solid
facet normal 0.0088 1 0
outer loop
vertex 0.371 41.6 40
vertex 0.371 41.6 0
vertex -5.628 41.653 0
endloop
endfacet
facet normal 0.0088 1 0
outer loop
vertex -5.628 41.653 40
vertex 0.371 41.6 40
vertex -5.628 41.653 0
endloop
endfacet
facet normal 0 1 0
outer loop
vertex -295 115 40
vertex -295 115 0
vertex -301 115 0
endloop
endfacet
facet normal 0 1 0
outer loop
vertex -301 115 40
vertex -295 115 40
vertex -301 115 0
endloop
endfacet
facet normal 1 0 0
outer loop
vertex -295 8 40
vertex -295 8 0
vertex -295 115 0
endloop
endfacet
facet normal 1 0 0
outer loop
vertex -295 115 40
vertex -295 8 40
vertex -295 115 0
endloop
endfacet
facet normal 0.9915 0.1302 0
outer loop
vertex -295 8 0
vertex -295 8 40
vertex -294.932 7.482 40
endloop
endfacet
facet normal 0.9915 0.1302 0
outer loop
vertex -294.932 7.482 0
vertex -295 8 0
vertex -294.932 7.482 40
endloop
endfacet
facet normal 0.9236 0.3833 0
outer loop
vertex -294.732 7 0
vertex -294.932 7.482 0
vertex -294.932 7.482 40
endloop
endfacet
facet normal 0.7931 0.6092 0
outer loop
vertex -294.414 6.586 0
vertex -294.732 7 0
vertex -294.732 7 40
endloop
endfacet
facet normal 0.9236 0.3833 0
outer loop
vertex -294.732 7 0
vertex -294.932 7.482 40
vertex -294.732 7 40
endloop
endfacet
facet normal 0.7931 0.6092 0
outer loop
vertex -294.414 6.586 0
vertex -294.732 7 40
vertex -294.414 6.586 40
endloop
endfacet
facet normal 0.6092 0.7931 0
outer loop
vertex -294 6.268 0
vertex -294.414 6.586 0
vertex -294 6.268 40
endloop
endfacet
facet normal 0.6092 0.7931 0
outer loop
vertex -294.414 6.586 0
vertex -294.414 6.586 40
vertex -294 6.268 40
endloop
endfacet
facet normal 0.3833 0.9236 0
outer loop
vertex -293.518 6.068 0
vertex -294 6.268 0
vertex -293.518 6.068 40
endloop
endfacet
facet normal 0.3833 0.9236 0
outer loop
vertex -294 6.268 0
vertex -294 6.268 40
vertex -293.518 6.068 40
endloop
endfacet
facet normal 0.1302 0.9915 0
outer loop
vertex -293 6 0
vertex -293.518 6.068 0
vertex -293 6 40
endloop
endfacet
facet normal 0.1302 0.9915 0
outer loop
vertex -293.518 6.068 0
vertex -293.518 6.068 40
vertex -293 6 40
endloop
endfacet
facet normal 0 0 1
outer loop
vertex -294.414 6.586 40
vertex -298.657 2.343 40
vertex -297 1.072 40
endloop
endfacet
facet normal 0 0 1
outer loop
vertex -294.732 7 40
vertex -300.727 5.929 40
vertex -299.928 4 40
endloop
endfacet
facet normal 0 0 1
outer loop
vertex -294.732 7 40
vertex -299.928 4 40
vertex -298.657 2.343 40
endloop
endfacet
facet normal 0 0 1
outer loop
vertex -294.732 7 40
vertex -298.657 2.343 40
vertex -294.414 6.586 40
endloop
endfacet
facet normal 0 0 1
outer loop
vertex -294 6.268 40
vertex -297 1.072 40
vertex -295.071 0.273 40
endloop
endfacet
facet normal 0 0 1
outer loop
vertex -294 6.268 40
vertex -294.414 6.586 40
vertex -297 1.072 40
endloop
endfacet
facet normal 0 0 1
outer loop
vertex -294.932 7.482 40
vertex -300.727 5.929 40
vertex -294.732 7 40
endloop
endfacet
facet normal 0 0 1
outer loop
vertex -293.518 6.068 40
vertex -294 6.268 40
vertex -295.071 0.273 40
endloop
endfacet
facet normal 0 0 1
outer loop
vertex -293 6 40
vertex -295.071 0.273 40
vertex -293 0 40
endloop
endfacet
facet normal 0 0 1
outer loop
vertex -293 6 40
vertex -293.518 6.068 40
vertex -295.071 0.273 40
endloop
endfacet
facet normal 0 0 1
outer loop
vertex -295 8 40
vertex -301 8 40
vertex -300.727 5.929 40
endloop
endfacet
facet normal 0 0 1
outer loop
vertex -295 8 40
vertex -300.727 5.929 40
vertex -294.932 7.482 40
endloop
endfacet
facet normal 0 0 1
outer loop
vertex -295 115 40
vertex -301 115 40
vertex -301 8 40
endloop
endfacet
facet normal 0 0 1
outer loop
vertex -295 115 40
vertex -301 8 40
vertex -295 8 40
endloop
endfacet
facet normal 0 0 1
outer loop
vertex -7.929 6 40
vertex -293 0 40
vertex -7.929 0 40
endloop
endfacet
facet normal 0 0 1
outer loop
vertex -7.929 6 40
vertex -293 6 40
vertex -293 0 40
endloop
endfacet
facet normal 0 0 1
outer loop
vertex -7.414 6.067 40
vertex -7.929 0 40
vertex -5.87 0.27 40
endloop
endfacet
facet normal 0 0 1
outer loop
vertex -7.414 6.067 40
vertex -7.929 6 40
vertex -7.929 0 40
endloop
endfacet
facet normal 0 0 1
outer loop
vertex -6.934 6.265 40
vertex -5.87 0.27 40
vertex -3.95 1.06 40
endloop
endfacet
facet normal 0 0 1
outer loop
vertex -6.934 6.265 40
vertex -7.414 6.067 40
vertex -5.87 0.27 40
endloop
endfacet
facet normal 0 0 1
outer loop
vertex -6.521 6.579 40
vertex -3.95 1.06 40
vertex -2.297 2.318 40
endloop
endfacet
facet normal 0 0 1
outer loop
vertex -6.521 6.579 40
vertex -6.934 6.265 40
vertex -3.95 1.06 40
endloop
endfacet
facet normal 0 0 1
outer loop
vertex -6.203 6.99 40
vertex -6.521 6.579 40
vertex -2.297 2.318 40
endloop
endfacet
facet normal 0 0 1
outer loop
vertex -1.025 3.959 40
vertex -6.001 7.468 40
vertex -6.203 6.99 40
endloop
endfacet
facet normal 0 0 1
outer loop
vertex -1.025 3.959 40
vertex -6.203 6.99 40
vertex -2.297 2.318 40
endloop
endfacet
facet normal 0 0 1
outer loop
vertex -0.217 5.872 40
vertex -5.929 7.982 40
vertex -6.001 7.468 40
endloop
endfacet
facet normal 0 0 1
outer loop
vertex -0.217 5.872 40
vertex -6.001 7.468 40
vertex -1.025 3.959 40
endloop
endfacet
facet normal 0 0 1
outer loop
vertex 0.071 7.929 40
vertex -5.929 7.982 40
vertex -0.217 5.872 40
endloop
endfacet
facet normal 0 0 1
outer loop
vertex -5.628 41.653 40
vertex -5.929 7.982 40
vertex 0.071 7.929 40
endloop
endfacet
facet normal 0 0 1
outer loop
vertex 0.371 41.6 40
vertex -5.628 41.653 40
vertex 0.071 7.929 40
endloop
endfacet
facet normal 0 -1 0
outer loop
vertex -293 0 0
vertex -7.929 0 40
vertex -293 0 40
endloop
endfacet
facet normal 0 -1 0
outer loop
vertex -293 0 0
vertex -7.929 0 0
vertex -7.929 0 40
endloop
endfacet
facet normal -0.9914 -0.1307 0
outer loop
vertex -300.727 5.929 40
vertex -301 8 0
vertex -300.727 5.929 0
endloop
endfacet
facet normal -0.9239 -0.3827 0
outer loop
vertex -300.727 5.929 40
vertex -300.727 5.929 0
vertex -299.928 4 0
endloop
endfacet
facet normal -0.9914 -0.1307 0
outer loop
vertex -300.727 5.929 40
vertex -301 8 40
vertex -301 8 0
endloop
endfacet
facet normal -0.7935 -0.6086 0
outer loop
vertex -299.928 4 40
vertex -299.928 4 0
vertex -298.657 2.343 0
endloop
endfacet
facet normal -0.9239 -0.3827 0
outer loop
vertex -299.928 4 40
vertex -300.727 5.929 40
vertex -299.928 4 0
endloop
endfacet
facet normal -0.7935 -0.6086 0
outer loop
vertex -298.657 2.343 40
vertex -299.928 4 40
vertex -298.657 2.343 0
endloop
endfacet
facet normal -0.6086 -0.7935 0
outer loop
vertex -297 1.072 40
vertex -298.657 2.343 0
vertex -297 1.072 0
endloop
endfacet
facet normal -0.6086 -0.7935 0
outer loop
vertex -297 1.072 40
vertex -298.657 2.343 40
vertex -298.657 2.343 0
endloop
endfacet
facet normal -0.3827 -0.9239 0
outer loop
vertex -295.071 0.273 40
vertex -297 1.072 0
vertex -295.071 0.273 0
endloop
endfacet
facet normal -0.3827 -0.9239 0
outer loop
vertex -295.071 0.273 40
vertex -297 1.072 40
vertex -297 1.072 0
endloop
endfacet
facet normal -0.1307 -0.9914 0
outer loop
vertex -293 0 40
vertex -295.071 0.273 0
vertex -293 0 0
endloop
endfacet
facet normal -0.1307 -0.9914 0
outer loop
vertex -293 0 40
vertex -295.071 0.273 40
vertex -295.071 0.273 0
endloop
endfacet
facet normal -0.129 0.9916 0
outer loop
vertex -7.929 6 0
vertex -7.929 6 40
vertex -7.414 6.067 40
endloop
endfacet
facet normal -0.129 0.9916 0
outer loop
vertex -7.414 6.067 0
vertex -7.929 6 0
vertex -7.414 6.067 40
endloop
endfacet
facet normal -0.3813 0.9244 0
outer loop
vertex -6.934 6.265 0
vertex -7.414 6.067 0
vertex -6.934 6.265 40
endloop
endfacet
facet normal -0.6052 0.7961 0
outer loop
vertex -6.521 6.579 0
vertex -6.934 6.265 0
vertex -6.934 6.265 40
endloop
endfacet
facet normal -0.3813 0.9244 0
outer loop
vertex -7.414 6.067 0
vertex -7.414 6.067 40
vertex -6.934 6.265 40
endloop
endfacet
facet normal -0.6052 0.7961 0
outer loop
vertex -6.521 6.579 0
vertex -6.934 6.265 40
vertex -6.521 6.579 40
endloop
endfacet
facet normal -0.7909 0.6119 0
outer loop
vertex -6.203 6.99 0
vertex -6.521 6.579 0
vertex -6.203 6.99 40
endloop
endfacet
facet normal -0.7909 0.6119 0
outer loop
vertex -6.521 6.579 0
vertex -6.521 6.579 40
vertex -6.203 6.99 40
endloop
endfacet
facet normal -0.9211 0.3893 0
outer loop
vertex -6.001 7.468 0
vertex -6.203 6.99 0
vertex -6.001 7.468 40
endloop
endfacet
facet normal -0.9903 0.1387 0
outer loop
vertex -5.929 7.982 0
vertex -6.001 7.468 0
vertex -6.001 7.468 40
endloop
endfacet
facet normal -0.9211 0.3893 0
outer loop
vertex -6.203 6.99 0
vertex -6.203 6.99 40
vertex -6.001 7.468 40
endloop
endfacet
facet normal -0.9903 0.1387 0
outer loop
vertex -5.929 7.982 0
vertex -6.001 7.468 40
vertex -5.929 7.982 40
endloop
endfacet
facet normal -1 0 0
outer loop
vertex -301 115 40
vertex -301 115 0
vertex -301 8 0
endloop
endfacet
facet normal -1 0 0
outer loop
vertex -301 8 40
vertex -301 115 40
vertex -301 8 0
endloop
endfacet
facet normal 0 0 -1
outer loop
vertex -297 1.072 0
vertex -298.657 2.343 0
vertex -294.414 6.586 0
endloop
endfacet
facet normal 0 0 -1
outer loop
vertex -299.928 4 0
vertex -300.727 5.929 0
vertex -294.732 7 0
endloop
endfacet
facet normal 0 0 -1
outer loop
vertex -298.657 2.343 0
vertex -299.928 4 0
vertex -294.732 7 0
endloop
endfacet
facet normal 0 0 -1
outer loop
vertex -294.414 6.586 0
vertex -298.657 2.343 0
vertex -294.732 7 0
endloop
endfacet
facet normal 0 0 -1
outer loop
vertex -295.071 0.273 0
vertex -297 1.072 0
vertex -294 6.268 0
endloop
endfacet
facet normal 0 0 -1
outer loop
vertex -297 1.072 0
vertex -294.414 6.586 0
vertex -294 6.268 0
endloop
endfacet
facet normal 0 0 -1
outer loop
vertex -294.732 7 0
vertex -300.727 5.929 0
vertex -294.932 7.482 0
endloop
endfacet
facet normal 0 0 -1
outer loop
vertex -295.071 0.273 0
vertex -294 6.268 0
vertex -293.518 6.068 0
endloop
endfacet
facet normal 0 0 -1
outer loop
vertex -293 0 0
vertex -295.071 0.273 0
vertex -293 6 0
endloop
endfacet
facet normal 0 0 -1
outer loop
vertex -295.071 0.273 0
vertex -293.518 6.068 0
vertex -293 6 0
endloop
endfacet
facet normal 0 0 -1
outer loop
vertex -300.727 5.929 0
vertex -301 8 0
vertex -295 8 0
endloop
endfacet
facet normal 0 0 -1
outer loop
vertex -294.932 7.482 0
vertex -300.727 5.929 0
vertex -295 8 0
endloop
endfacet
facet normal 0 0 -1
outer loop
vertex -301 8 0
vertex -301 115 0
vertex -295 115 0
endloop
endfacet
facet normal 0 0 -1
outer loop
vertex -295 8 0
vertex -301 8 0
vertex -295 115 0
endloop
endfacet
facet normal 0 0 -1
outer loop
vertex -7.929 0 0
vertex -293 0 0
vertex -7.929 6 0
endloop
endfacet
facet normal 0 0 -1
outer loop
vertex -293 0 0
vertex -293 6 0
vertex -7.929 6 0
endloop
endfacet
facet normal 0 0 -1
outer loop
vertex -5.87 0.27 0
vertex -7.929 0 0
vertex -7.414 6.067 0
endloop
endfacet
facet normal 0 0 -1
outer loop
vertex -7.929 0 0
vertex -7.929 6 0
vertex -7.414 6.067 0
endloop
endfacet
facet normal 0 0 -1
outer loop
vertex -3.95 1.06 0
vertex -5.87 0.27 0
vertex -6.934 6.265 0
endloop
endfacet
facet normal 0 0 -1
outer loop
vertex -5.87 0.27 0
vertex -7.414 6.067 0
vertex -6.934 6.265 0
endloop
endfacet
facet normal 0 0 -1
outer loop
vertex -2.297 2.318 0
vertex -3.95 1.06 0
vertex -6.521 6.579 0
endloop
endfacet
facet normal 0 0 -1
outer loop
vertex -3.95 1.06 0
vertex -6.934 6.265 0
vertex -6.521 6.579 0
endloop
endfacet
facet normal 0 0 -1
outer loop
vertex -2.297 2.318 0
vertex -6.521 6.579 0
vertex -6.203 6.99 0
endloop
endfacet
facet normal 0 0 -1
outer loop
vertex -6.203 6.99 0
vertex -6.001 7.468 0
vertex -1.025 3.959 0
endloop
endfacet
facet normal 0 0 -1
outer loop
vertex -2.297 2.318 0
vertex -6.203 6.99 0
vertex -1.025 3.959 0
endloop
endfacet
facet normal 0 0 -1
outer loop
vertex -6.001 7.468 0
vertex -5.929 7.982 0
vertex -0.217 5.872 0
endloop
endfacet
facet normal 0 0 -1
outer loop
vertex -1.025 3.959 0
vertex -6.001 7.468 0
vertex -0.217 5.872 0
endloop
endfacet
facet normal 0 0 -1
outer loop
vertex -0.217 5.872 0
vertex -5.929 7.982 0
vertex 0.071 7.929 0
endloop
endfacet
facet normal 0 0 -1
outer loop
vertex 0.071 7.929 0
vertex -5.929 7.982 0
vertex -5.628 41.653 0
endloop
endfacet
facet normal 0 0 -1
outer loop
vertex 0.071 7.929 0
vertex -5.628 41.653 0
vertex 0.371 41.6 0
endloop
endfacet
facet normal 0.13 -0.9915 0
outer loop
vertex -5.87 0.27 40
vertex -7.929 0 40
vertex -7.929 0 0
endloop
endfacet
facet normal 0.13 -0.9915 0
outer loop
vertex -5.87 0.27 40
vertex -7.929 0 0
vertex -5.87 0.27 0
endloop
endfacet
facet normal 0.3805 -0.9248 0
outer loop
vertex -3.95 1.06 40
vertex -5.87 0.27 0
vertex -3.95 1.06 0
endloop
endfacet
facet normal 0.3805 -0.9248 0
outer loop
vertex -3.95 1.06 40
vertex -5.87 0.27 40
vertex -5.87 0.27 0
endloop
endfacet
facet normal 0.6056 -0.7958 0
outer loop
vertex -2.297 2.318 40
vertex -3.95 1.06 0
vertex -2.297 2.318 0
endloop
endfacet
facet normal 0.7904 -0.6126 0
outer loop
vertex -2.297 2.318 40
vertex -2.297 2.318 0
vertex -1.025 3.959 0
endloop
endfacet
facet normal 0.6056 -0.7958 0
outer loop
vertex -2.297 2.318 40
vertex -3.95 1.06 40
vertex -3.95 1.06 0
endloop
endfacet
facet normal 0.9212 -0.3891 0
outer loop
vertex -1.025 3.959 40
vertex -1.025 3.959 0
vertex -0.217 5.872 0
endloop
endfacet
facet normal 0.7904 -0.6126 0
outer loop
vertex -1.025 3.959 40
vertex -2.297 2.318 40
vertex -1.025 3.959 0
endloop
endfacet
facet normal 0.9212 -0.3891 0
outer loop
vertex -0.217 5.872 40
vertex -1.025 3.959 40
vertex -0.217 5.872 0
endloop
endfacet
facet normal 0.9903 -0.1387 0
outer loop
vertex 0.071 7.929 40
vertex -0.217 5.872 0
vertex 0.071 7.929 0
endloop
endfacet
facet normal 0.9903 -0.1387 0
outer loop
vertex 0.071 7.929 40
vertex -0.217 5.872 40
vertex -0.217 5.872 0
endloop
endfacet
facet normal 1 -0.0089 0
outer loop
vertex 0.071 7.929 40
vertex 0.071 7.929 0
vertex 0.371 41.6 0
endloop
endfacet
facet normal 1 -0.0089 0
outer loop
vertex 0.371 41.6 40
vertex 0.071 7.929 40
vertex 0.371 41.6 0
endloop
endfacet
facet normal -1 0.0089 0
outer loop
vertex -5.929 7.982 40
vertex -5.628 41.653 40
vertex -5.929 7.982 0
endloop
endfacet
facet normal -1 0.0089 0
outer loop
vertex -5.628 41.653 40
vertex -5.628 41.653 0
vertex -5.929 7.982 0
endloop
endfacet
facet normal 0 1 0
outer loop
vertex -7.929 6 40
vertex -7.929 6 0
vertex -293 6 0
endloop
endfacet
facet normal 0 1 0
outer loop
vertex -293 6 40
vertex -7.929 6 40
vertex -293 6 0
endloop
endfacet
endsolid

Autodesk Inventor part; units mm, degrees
ref_plane "YZ Plane" through (0, 0, 0) normal (1, 0, 0) x (0, 1, 0)
ref_plane "XZ Plane" through (0, 0, 0) normal (0, 1, 0) x (-1, 0, 0)
ref_plane "XY Plane" through (0, 0, 0) normal (0, 0, 1) x (1, 0, 0)
sketch "Sketch1" plane through (0, 0, 0) normal (0, 0, 1) x (1, 0, 0)
  line L0 (0, 138) -> (0, -23) construction
  line L1 (-361.2743, 0) -> (60.6456, 0) construction
  line L2 (0, 0) -> (0.3713, 41.5996)
  line L3 (0.3713, 41.5996) -> (-5.6284, 41.6531)
  line L4 (-5.6284, 41.6531) -> (-5.9467, 6)
  line L5 (-5.9467, 6) -> (-295, 6)
  line L6 (-295, 6) -> (-295, 115)
  line L7 (-295, 115) -> (-301, 115)
  line L8 (-301, 115) -> (-301, 0)
  line L9 (0, 0) -> (-301, 0)
  dimension "d4" = 41.5996
  dimension "d5" = 301
  dimension "d6" = 115
  dimension "d7" = 6
  dimension "d8" = 6
  dimension "d9" = 6
extrude "Extrusion3" add sketch "Sketch1" along normal blind 40
fillet "Fillet1" radius 2 2 edges at (-5.9467, 6, 20) (-295, 6, 20)
fillet "Fillet2" radius 8 2 edges at (0, 0, 20) (-301, 0, 20)
equation "\"d8\" = d7"
equation "\"d9\" = d7"
properties part number "17-0028-0119" material "Copper"
